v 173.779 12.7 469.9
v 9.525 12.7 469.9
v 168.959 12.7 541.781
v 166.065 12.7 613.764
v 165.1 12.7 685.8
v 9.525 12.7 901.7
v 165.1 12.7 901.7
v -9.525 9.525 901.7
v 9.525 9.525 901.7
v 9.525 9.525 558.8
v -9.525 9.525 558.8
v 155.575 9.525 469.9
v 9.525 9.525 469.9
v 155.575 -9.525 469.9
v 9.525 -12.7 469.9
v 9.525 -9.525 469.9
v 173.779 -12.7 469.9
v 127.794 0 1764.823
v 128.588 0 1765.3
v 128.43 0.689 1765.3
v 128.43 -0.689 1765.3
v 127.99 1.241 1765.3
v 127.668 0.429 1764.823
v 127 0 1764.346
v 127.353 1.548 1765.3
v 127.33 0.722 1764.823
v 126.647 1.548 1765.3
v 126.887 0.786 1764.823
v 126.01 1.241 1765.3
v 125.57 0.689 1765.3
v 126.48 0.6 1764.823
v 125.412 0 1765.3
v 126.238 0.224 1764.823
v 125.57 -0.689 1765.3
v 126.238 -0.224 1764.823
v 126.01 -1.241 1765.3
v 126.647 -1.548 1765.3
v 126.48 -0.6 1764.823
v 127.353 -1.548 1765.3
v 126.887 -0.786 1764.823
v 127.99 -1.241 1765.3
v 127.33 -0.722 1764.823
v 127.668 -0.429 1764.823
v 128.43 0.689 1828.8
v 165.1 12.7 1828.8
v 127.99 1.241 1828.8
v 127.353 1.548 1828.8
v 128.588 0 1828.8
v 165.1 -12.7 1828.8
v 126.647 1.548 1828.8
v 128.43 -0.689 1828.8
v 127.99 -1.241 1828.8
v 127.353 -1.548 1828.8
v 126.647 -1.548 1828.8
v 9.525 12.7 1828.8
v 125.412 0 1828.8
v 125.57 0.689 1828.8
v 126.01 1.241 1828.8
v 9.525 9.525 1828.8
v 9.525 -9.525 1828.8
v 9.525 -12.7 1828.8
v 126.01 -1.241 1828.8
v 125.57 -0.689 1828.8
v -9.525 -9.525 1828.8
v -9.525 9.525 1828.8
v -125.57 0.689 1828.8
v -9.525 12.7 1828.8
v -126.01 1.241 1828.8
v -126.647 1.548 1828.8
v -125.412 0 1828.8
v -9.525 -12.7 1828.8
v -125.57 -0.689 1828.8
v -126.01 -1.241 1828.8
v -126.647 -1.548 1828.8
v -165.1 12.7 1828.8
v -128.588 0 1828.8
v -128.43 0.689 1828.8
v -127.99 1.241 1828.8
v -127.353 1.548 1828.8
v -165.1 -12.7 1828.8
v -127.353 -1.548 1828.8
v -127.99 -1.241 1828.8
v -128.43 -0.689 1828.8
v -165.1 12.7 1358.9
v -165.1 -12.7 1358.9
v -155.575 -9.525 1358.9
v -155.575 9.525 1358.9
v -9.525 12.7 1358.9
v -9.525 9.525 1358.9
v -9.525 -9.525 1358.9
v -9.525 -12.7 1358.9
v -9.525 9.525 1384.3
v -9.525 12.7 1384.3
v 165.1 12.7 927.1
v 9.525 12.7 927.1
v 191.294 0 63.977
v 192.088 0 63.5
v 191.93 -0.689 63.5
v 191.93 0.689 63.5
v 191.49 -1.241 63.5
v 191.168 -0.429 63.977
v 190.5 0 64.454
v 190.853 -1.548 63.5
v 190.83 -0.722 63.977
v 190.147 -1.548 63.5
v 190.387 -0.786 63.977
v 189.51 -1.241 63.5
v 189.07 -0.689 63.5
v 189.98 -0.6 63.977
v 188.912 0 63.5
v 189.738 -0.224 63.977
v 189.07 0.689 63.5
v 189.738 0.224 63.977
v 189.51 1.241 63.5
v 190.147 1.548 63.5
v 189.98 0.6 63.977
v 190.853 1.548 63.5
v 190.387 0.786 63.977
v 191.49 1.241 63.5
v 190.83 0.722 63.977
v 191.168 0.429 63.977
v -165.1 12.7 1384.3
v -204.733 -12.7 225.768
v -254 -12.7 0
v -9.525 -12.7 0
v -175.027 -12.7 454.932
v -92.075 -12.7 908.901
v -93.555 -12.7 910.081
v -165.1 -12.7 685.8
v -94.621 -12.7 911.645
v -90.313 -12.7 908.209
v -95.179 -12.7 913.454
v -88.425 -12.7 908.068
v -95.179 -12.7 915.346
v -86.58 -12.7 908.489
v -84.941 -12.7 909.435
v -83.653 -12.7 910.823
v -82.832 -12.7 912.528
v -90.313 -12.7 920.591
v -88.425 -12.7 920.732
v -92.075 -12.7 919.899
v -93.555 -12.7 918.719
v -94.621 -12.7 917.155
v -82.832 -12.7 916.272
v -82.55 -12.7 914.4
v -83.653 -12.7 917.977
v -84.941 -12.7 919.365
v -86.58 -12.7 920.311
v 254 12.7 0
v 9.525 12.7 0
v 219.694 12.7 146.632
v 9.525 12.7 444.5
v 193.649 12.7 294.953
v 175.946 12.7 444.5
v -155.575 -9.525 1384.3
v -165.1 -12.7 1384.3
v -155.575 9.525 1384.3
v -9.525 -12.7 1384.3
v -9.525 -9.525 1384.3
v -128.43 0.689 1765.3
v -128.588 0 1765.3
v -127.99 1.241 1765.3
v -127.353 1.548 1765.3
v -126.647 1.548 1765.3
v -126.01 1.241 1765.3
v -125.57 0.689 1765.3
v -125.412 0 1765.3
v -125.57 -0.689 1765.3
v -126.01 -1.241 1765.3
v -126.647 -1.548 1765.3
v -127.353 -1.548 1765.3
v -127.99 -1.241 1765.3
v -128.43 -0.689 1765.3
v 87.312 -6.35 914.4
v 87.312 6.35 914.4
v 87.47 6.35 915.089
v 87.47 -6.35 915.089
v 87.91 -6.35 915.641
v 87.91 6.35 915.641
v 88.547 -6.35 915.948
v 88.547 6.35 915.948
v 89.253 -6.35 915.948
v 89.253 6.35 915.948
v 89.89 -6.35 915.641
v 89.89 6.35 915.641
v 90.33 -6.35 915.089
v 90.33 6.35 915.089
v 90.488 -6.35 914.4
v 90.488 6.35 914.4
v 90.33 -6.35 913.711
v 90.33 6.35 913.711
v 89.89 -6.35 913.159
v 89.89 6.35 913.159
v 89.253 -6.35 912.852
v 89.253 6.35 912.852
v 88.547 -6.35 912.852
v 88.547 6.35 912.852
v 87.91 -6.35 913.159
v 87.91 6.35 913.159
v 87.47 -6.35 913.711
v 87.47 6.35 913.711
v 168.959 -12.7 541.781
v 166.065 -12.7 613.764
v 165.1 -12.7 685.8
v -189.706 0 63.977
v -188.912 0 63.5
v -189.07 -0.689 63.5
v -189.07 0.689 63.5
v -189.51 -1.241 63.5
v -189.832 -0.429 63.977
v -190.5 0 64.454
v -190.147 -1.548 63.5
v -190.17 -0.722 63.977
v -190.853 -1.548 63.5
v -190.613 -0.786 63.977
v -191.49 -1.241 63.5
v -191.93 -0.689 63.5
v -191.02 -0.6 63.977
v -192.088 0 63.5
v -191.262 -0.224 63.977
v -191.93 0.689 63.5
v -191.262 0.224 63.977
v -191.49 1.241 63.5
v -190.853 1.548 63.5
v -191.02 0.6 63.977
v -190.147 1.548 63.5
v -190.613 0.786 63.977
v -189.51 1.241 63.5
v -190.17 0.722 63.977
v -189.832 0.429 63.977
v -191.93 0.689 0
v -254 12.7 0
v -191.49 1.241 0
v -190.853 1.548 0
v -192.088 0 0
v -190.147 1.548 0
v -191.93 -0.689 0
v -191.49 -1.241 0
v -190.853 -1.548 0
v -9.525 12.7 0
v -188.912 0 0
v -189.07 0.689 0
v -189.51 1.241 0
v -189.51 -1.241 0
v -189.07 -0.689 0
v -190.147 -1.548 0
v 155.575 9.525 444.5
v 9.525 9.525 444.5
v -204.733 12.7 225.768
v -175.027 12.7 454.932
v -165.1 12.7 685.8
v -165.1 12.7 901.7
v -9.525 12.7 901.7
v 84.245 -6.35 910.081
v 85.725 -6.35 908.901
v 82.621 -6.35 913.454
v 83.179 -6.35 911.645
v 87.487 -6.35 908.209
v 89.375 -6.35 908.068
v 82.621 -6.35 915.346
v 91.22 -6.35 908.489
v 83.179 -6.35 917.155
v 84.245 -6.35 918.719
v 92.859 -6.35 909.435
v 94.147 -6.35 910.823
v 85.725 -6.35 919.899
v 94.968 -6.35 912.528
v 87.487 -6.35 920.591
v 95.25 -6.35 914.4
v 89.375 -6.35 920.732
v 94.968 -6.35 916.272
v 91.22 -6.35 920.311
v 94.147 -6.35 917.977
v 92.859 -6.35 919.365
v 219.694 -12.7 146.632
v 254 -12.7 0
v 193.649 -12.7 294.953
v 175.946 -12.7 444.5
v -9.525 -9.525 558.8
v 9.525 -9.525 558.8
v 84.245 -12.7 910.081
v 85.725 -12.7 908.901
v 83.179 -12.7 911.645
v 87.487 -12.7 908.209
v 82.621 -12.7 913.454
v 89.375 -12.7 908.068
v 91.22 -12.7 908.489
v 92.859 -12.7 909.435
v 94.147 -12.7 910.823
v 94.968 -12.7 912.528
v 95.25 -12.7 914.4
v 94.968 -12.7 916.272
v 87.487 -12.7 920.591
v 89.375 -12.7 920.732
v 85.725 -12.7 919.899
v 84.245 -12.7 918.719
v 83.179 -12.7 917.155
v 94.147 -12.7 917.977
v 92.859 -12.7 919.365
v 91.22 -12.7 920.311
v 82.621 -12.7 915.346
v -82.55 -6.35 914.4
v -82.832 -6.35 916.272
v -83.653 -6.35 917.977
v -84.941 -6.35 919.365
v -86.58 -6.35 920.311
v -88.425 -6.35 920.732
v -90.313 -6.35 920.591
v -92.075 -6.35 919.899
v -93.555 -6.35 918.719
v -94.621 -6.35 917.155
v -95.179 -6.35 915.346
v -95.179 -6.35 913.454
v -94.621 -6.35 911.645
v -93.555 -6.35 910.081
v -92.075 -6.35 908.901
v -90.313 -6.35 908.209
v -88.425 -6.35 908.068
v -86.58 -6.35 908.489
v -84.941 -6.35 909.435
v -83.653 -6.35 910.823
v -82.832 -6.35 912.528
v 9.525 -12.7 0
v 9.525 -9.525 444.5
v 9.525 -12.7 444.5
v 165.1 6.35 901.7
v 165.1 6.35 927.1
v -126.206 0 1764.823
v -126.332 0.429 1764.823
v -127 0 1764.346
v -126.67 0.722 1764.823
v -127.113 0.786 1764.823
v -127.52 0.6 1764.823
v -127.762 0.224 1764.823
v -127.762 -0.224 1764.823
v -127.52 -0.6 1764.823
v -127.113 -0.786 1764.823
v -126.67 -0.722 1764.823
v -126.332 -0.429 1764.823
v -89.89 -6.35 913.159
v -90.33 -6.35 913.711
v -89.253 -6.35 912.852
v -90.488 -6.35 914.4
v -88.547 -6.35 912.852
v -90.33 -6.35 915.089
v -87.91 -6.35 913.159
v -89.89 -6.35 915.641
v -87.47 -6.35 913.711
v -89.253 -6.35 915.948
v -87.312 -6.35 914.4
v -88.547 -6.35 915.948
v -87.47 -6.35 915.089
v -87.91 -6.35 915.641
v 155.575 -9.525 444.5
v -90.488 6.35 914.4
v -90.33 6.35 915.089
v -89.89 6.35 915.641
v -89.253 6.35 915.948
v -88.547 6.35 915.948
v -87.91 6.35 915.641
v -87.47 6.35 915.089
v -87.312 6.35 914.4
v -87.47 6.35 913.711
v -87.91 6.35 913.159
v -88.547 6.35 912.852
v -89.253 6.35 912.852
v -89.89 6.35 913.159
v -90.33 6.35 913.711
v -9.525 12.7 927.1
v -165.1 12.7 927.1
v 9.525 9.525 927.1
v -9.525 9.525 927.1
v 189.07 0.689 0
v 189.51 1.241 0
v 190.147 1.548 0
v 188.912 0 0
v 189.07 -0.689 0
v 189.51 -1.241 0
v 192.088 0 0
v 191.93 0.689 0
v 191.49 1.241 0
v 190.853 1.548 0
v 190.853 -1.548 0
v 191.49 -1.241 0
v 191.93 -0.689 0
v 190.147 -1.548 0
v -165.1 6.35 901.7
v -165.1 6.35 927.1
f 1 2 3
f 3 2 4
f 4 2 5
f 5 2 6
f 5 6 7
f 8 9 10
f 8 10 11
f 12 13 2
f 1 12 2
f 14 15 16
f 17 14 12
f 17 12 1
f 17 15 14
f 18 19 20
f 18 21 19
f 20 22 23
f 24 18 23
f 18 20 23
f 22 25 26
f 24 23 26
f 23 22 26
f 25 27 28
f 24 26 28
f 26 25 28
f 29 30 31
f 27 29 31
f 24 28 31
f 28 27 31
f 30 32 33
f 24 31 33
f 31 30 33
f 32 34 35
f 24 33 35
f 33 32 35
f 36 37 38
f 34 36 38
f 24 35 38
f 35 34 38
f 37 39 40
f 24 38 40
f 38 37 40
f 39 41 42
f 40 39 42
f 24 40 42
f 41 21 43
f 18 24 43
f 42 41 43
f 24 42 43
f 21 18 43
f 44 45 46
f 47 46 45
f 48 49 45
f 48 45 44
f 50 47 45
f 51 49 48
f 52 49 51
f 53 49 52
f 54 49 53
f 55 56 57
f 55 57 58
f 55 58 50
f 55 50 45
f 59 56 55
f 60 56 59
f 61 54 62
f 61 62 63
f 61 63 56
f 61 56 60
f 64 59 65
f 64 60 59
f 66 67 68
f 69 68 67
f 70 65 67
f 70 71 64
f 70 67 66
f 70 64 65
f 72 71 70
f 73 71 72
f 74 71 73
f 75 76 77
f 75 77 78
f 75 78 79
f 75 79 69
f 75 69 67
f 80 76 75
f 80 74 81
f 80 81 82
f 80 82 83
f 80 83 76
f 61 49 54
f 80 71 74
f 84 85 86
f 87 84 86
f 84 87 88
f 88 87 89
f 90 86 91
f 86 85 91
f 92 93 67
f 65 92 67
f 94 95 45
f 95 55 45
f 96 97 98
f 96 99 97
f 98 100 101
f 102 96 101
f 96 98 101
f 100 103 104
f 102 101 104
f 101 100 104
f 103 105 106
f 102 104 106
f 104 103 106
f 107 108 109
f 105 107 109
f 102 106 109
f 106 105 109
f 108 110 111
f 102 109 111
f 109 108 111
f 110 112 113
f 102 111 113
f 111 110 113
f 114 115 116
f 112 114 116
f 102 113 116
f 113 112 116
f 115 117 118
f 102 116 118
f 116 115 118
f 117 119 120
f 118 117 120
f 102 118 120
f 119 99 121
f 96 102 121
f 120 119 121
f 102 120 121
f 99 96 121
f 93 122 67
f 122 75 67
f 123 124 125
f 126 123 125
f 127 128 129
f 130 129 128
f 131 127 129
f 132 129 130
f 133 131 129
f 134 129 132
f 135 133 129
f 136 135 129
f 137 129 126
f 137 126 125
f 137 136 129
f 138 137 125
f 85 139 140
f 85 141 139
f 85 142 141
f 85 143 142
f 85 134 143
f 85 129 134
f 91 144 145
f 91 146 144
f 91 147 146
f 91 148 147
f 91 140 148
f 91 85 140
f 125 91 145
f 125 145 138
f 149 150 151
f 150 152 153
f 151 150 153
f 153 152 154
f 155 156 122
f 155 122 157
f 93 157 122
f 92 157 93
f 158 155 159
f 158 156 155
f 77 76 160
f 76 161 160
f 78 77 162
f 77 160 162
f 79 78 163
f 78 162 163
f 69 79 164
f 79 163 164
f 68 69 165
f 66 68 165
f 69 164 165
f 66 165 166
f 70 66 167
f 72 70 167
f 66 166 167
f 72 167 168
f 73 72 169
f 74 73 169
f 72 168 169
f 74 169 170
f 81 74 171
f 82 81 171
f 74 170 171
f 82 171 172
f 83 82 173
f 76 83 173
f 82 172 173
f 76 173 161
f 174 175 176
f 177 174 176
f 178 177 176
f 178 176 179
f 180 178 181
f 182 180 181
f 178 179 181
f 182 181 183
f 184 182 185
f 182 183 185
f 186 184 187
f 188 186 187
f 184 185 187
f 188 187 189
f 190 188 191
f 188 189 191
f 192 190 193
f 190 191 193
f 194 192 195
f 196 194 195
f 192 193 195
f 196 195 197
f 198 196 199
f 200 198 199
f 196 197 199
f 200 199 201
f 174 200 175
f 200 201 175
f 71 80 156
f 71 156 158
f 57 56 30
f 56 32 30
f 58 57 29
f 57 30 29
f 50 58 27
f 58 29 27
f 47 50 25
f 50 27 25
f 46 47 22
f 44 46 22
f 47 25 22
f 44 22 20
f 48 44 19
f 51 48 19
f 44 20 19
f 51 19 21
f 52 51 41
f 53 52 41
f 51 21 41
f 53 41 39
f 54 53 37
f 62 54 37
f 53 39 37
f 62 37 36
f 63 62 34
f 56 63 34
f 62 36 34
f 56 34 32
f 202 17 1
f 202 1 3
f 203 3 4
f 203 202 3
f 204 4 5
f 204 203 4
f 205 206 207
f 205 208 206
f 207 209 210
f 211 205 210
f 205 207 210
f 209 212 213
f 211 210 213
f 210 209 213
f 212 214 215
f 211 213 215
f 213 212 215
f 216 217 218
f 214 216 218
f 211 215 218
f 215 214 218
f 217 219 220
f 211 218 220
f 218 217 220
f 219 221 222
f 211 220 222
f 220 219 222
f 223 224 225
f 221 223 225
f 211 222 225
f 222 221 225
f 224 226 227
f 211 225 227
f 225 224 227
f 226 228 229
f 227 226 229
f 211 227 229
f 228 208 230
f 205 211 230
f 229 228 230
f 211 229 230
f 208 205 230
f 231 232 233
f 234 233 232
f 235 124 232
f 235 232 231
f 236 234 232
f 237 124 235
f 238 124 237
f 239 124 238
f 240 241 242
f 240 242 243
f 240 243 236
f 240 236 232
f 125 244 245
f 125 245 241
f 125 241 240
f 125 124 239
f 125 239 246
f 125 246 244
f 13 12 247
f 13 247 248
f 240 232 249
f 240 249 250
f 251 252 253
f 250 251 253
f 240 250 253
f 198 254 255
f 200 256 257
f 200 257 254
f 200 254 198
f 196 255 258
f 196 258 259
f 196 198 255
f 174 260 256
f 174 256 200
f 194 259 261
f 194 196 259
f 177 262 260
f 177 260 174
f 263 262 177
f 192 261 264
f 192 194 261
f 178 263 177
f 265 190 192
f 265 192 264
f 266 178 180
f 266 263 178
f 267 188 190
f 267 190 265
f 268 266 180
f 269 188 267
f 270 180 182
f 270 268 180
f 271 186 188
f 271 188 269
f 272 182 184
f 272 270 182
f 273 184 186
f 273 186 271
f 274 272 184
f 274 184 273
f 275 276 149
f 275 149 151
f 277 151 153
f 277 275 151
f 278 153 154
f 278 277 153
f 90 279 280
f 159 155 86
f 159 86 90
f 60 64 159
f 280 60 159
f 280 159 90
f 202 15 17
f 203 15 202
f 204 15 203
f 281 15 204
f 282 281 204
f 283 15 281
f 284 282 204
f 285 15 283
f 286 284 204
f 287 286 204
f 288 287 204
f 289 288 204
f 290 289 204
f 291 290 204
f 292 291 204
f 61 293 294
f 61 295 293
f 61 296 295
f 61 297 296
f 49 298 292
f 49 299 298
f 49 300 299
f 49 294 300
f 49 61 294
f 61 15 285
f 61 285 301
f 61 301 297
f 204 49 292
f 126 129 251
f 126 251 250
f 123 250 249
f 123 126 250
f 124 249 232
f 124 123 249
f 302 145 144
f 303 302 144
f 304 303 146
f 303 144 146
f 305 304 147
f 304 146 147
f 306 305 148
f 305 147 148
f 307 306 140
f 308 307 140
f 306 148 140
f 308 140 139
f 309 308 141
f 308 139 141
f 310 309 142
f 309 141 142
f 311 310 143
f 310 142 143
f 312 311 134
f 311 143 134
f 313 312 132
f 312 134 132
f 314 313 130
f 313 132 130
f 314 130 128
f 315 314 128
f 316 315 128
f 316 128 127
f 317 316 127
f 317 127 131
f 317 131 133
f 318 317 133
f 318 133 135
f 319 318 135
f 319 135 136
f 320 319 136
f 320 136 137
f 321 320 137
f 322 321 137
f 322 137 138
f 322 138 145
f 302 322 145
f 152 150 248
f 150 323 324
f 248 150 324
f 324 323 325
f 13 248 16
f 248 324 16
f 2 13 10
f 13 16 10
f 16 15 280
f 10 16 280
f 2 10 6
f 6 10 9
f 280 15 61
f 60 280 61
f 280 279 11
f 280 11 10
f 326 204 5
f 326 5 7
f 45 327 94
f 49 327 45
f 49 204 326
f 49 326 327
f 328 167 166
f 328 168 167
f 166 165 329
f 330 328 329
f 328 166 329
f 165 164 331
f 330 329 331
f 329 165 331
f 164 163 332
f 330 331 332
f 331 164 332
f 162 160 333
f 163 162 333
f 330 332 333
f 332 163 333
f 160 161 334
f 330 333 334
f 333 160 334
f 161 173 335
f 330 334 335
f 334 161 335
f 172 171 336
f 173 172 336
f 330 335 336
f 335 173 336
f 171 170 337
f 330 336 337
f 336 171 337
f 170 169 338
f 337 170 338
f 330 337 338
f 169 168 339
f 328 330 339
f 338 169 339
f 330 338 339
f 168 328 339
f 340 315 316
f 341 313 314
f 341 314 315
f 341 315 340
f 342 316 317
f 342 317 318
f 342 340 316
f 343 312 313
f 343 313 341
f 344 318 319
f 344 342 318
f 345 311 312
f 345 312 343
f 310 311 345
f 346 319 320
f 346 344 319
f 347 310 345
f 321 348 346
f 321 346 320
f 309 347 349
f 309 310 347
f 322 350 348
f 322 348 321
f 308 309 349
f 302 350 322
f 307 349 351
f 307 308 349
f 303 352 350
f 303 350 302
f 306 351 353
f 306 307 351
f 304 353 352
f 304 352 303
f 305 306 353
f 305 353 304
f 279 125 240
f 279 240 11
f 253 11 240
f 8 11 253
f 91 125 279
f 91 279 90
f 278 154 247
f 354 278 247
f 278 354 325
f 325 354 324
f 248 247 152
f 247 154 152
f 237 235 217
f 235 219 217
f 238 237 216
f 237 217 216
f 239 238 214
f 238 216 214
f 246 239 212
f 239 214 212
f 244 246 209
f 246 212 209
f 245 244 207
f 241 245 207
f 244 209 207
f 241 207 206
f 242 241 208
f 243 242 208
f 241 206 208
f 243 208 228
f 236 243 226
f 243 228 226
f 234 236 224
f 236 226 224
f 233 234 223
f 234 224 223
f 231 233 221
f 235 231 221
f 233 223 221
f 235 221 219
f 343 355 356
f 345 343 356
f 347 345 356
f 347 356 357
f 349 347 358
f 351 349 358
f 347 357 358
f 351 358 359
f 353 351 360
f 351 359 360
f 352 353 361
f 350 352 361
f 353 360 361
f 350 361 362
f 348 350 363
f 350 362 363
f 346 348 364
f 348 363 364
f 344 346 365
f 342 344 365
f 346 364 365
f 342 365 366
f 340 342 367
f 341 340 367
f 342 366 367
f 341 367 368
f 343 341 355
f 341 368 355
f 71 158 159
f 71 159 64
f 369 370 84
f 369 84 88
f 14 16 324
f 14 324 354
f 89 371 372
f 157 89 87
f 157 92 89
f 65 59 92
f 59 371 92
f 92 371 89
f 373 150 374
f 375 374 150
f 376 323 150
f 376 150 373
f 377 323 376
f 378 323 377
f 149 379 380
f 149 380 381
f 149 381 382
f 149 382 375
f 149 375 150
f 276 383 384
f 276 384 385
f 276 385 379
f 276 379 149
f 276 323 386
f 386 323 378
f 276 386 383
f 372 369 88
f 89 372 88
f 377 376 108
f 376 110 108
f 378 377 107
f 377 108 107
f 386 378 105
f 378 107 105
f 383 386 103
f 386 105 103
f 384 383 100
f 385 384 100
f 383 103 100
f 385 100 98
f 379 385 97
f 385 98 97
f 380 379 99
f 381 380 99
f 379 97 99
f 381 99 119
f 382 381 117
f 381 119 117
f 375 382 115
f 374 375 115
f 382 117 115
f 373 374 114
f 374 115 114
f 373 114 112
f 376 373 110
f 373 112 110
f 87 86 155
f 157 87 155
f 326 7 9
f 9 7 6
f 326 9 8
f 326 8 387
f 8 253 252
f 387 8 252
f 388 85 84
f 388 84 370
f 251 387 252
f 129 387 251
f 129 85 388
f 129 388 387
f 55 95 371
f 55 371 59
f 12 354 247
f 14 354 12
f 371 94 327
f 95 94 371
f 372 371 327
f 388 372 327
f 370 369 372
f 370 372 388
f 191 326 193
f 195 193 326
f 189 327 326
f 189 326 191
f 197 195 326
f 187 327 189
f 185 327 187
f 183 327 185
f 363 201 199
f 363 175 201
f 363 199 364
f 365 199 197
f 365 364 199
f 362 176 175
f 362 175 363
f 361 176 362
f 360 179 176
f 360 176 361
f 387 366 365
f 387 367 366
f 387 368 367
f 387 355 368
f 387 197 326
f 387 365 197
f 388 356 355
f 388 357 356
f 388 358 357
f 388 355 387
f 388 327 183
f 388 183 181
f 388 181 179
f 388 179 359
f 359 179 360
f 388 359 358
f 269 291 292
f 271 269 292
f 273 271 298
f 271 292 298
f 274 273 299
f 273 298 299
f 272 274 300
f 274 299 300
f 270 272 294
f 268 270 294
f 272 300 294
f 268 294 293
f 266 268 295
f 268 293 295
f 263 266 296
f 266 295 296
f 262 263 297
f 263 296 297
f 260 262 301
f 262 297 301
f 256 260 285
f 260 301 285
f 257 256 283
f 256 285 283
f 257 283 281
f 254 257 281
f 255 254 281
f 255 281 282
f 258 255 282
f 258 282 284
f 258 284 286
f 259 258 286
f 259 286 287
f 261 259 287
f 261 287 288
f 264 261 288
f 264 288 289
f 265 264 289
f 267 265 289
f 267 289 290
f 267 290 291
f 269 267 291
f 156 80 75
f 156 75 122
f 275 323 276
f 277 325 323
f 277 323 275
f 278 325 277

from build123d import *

# Parameters (mm, degrees)
F1_DEPTH       = 12.7
F28_W          = 19.05
F28_H          = 558.8
F29_DEPTH      = 25.4
F3_D           = 3.175
F3_DEPTH       = 63.5
F3_CBORE_D     = 12.7
F3_CBORE_DEPTH = 6.35
F3_TIP         = 0.9538662327
F5_D           = 3.175
F5_DEPTH       = 63.5
F5_TIP         = 0.9538662327
F7_D           = 3.175
F7_DEPTH       = 63.5
F7_TIP         = 0.9538662327
F8_W           = 330.2
F8_H           = 25.4
F9_DEPTH       = 6.35
F10_W          = 19.05
F10_H          = 1270
F11_DEPTH      = 3.175
F12_W          = 19.05
F12_H          = 342.9
F13_DEPTH      = 3.175
F14_W          = 19.05
F14_H          = 901.7
F15_DEPTH      = 3.175
F17_W          = 50.8
F17_H          = 25.4
F18_DEPTH      = 25.4
F16_W          = 193.68262
F16_H          = 12.7
F19_DEPTH      = 3.175
F20_W          = 203.2
F20_H          = 25.4
F21_DEPTH      = 3.175
F22_W          = 19.05
F22_H          = 25.4
F23_DEPTH      = 25.4
F24_W          = 158.75
F24_H          = 25.4
F25_DEPTH      = 3.175
F26_W          = 158.75
F26_H          = 25.4
F27_DEPTH      = 3.175


with BuildPart() as f1:
    # F0 (on Front) → F1 (new body, symmetric)
    with BuildSketch(Plane.XZ):
        with BuildLine():
            Line((165.1, 1828.8), (0, 1828.8))
            Line((0, 1828.8), (-165.1, 1828.8))
            Line((-165.1, 1828.8), (-165.1, 685.8))
            ThreePointArc((-165.1, 685.8), (-187.4175900274, 340.0309838924), (-254, 0))
            Line((-254, 0), (0, 0))
            Line((0, 0), (254, 0))
            ThreePointArc((254, 0), (187.4175900273, 340.0309838924), (165.1, 685.8))
            Line((165.1, 685.8), (165.1, 1828.8))
        make_face()
    extrude(amount=F1_DEPTH, both=True)

    # F28 (on face) → F29 (cut)
    with BuildSketch(Plane.XZ.offset(12.7)):
        with Locations((0, 279.4)):
            Rectangle(F28_W, F28_H)
    extrude(amount=-F29_DEPTH, mode=Mode.SUBTRACT)

    # F3
    with Locations(Plane.XZ.offset(12.7)):
        with Locations((-88.9, 914.4), (88.9, 914.4)):
            CounterBoreHole(F3_D / 2, F3_CBORE_D / 2, F3_CBORE_DEPTH, depth=F3_DEPTH)
            with Locations((0, 0, -(F3_DEPTH + F3_TIP / 2))):  # 118° drill point
                Cone(0, F3_D / 2, F3_TIP, mode=Mode.SUBTRACT)

    # F5
    with Locations(Plane.XY.offset(1828.8)):
        with Locations((-127, 0), (127, 0)):
            Hole(F5_D / 2, depth=F5_DEPTH)
            with Locations((0, 0, -(F5_DEPTH + F5_TIP / 2))):  # 118° drill point
                Cone(0, F5_D / 2, F5_TIP, mode=Mode.SUBTRACT)

    # F7
    with Locations(Plane(origin=(0, 0, 0), x_dir=(1, 0, 0), z_dir=(0, 0, -1))):
        with Locations((-190.5, 0), (190.5, 0)):
            Hole(F7_D / 2, depth=F7_DEPTH)
            with Locations((0, 0, -(F7_DEPTH + F7_TIP / 2))):  # 118° drill point
                Cone(0, F7_D / 2, F7_TIP, mode=Mode.SUBTRACT)

    # F8 (on face) → F9 (cut)
    with BuildSketch(Plane(origin=(0, 12.7, 0), x_dir=(-1, 0, 0), z_dir=(0, 1, 0))):
        with Locations((0, 914.4)):
            Rectangle(F8_W, F8_H)
    extrude(amount=-F9_DEPTH, mode=Mode.SUBTRACT)

    # F10 (on face) → F11 (cut)
    with BuildSketch(Plane.XZ.offset(12.7)):
        with Locations((0, 1193.8)):
            Rectangle(F10_W, F10_H)
    extrude(amount=-F11_DEPTH, mode=Mode.SUBTRACT)

    # F12 (on face) → F13 (cut)
    with BuildSketch(Plane(origin=(0, 12.7, 0), x_dir=(-1, 0, 0), z_dir=(0, 1, 0))):
        with Locations((0, 730.25)):
            Rectangle(F12_W, F12_H)
    extrude(amount=-F13_DEPTH, mode=Mode.SUBTRACT)

    # F14 (on face) → F15 (cut)
    with BuildSketch(Plane(origin=(0, 12.7, 0), x_dir=(-1, 0, 0), z_dir=(0, 1, 0))):
        with Locations((0, 1377.95)):
            Rectangle(F14_W, F14_H)
    extrude(amount=-F15_DEPTH, mode=Mode.SUBTRACT)

    # F17 (on face) → F18 (cut)
    with BuildSketch(Plane.XZ.offset(12.7)):
        with Locations((180.975, 457.2)):
            Rectangle(F17_W, F17_H)
    extrude(amount=-F18_DEPTH, mode=Mode.SUBTRACT)

    # F16 (on face) → F19 (cut)
    with BuildSketch(Plane.XZ.offset(12.7)):
        with Locations((96.84131, 463.55)):
            Rectangle(F16_W, F16_H)
        with Locations((96.84131, 450.85)):
            Rectangle(F16_W, F16_H)
    extrude(amount=-F19_DEPTH, mode=Mode.SUBTRACT)

    # F20 (on face) → F21 (cut)
    with BuildSketch(Plane(origin=(0, 12.7, 0), x_dir=(-1, 0, 0), z_dir=(0, 1, 0))):
        with Locations((-101.6, 457.2)):
            Rectangle(F20_W, F20_H)
    extrude(amount=-F21_DEPTH, mode=Mode.SUBTRACT)

    # F22 (on face) → F23 (cut)
    with BuildSketch(Plane.XZ.offset(12.7)):
        with Locations((-165.1, 1371.6)):
            Rectangle(F22_W, F22_H)
    extrude(amount=-F23_DEPTH, mode=Mode.SUBTRACT)

    # F24 (on face) → F25 (cut)
    with BuildSketch(Plane.XZ.offset(12.7)):
        with Locations((-85.725, 1371.6)):
            Rectangle(F24_W, F24_H)
    extrude(amount=-F25_DEPTH, mode=Mode.SUBTRACT)

    # F26 (on face) → F27 (cut)
    with BuildSketch(Plane(origin=(0, 12.7, 0), x_dir=(-1, 0, 0), z_dir=(0, 1, 0))):
        with Locations((85.725, 1371.6)):
            Rectangle(F26_W, F26_H)
    extrude(amount=-F27_DEPTH, mode=Mode.SUBTRACT)


solid = f1.part
